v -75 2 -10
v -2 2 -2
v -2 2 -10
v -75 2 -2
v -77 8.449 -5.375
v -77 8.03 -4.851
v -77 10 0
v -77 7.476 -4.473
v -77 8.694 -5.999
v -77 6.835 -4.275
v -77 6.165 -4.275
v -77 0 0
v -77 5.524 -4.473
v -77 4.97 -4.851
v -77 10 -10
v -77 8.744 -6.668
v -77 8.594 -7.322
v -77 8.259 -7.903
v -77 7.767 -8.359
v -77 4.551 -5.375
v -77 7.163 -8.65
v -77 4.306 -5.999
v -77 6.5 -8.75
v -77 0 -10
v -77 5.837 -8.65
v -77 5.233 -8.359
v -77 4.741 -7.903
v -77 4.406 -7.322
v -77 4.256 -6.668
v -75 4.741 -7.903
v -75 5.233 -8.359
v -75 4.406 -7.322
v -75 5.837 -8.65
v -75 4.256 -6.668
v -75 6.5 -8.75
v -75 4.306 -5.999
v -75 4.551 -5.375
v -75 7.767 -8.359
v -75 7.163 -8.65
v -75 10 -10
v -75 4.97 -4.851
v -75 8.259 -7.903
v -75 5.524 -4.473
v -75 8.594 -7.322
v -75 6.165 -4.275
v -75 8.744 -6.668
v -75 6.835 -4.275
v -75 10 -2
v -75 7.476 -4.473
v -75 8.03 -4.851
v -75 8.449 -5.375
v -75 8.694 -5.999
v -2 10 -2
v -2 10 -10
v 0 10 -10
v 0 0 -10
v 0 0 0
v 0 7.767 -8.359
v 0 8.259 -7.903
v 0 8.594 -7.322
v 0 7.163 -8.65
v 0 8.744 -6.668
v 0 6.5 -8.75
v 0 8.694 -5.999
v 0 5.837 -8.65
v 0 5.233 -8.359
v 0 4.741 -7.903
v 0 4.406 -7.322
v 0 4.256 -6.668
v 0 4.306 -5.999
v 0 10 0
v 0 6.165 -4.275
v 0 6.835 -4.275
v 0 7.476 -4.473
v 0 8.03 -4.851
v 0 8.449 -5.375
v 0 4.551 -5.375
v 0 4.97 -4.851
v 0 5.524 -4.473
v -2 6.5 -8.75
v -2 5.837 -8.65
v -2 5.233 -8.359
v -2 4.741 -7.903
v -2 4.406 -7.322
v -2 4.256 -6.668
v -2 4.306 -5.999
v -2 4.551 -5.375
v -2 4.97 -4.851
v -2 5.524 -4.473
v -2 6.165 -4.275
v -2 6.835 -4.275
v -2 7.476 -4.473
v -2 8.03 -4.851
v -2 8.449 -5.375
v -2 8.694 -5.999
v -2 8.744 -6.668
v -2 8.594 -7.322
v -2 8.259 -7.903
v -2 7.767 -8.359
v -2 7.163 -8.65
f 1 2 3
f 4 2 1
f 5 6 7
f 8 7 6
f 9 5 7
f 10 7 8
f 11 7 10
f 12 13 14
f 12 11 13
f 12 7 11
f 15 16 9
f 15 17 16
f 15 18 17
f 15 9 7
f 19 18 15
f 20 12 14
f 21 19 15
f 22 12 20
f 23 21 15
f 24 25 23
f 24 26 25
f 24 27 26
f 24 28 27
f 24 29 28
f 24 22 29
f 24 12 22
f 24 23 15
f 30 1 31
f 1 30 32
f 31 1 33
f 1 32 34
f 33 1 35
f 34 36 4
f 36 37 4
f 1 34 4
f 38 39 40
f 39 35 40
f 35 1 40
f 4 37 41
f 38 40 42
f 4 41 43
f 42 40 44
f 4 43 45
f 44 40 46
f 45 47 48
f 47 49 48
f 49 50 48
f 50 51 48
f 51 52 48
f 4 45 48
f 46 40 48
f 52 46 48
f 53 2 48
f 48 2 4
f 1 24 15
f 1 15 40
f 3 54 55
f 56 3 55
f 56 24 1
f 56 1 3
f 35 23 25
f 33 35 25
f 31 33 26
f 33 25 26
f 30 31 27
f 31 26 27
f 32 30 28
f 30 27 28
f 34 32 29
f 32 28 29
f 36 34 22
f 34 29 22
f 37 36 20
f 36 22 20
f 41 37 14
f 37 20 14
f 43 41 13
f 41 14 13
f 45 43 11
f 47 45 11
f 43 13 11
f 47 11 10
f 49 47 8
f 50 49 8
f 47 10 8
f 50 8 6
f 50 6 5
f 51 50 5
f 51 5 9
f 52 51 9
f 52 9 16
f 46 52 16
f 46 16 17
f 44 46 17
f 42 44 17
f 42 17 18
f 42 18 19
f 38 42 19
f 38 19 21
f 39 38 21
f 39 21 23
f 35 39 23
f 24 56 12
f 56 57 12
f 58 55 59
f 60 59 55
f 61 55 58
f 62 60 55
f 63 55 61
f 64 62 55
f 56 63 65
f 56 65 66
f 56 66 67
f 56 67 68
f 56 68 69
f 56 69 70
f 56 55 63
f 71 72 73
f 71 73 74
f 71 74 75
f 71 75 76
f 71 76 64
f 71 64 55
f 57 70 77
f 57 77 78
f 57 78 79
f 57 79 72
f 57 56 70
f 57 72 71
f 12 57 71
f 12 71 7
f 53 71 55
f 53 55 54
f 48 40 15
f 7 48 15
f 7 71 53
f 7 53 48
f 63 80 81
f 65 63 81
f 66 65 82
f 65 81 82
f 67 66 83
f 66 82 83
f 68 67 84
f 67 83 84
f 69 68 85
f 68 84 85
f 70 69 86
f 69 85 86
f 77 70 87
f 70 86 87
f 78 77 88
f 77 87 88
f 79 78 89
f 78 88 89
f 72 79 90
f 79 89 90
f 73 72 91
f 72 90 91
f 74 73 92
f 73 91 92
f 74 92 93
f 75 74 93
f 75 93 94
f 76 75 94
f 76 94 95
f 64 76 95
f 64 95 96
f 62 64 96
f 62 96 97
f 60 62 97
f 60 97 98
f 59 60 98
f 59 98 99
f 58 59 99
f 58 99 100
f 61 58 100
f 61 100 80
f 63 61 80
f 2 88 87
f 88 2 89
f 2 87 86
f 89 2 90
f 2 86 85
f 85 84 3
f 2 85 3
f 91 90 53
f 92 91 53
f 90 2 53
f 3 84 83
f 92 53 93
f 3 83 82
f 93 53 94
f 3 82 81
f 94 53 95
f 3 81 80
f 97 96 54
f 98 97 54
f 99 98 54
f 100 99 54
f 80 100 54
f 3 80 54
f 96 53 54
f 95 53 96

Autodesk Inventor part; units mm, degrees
ref_plane "YZ Plane" through (0, 0, 0) normal (1, 0, 0) x (0, 1, 0)
ref_plane "XZ Plane" through (0, 0, 0) normal (0, 1, 0) x (-1, 0, 0)
ref_plane "XY Plane" through (0, 0, 0) normal (0, 0, 1) x (1, 0, 0)
sketch "Sketch1" plane through (0, 0, 0) normal (0, 1, 0) x (-1, 0, 0)
  line L0 (0, 0) -> (77, 0)
  line L1 (77, 0) -> (77, -10)
  line L2 (77, -10) -> (0, -10)
  line L3 (0, -10) -> (0, 0)
  line L4 (77, 0) -> (0, 0)
  line L5 (0, 0) -> (0, -2)
  line L6 (0, -2) -> (77, -2)
  line L7 (77, -2) -> (77, 0)
  point P0 (77, -2)
  point P1 (77, -5)
  dimension "d1" = 10
  dimension "d3" = 2
  dimension "d19" = 77
extrude "Extrusion1" add sketch "Sketch1" along normal blind 2 contours L6 L1 L2 L3
extrude "Extrusion2" add sketch "Sketch1" along normal blind 10 contours L0 L1 L6 L3
sketch "Sketch2" plane through (0, 0, -10) normal (1, 0, 0) x (0, 0, -1)
  line L0 (-10, 0) -> (0, 0) projected
  line L1 (-10, 0) -> (0, 0)
  line L2 (0, 0) -> (0, 10)
  line L3 (0, 10) -> (-10, 10)
  line L4 (-10, 10) -> (-10, 0)
  dimension "d8" = 10
  dimension "d9" = 10
extrude "Extrusion3" add sketch "Sketch2" against normal blind 2
sketch "Sketch3" plane through (-77, 0, -10) normal (-1, 0, 0) x (0, 0, 1)
  line L0 (0, 0) -> (0, 10) projected
  line L1 (10, 10) -> (0, 10) projected
  line L2 (0, 0) -> (10, 0)
  line L3 (10, 0) -> (10, 10)
  line L4 (10, 10) -> (0, 10)
  line L5 (0, 10) -> (0, 0)
  point P0 (10, 0)
extrude "Extrusion4" add sketch "Sketch3" against normal blind 2
sketch "Sketch5" plane through (0, 0, 0) normal (1, 0, 0) x (0, 0, -1)
  line L0 (0, 10) -> (10, 10) projected
  line L1 (10, 0) -> (10, 10) projected
  point P0 (0, 0)
  point P1 (6.5, 6.5)
  dimension "d23" = 3.5
  dimension "d24" = 3.5
hole "Hole1" at (0, 6.5, -6.5) direction (-1, 0, 0) diameter 4.5 end through all clearance for "Flat Head Machine Screw" size "M4" standard "Ansi Metric M Profile"
properties part number "Legs"
